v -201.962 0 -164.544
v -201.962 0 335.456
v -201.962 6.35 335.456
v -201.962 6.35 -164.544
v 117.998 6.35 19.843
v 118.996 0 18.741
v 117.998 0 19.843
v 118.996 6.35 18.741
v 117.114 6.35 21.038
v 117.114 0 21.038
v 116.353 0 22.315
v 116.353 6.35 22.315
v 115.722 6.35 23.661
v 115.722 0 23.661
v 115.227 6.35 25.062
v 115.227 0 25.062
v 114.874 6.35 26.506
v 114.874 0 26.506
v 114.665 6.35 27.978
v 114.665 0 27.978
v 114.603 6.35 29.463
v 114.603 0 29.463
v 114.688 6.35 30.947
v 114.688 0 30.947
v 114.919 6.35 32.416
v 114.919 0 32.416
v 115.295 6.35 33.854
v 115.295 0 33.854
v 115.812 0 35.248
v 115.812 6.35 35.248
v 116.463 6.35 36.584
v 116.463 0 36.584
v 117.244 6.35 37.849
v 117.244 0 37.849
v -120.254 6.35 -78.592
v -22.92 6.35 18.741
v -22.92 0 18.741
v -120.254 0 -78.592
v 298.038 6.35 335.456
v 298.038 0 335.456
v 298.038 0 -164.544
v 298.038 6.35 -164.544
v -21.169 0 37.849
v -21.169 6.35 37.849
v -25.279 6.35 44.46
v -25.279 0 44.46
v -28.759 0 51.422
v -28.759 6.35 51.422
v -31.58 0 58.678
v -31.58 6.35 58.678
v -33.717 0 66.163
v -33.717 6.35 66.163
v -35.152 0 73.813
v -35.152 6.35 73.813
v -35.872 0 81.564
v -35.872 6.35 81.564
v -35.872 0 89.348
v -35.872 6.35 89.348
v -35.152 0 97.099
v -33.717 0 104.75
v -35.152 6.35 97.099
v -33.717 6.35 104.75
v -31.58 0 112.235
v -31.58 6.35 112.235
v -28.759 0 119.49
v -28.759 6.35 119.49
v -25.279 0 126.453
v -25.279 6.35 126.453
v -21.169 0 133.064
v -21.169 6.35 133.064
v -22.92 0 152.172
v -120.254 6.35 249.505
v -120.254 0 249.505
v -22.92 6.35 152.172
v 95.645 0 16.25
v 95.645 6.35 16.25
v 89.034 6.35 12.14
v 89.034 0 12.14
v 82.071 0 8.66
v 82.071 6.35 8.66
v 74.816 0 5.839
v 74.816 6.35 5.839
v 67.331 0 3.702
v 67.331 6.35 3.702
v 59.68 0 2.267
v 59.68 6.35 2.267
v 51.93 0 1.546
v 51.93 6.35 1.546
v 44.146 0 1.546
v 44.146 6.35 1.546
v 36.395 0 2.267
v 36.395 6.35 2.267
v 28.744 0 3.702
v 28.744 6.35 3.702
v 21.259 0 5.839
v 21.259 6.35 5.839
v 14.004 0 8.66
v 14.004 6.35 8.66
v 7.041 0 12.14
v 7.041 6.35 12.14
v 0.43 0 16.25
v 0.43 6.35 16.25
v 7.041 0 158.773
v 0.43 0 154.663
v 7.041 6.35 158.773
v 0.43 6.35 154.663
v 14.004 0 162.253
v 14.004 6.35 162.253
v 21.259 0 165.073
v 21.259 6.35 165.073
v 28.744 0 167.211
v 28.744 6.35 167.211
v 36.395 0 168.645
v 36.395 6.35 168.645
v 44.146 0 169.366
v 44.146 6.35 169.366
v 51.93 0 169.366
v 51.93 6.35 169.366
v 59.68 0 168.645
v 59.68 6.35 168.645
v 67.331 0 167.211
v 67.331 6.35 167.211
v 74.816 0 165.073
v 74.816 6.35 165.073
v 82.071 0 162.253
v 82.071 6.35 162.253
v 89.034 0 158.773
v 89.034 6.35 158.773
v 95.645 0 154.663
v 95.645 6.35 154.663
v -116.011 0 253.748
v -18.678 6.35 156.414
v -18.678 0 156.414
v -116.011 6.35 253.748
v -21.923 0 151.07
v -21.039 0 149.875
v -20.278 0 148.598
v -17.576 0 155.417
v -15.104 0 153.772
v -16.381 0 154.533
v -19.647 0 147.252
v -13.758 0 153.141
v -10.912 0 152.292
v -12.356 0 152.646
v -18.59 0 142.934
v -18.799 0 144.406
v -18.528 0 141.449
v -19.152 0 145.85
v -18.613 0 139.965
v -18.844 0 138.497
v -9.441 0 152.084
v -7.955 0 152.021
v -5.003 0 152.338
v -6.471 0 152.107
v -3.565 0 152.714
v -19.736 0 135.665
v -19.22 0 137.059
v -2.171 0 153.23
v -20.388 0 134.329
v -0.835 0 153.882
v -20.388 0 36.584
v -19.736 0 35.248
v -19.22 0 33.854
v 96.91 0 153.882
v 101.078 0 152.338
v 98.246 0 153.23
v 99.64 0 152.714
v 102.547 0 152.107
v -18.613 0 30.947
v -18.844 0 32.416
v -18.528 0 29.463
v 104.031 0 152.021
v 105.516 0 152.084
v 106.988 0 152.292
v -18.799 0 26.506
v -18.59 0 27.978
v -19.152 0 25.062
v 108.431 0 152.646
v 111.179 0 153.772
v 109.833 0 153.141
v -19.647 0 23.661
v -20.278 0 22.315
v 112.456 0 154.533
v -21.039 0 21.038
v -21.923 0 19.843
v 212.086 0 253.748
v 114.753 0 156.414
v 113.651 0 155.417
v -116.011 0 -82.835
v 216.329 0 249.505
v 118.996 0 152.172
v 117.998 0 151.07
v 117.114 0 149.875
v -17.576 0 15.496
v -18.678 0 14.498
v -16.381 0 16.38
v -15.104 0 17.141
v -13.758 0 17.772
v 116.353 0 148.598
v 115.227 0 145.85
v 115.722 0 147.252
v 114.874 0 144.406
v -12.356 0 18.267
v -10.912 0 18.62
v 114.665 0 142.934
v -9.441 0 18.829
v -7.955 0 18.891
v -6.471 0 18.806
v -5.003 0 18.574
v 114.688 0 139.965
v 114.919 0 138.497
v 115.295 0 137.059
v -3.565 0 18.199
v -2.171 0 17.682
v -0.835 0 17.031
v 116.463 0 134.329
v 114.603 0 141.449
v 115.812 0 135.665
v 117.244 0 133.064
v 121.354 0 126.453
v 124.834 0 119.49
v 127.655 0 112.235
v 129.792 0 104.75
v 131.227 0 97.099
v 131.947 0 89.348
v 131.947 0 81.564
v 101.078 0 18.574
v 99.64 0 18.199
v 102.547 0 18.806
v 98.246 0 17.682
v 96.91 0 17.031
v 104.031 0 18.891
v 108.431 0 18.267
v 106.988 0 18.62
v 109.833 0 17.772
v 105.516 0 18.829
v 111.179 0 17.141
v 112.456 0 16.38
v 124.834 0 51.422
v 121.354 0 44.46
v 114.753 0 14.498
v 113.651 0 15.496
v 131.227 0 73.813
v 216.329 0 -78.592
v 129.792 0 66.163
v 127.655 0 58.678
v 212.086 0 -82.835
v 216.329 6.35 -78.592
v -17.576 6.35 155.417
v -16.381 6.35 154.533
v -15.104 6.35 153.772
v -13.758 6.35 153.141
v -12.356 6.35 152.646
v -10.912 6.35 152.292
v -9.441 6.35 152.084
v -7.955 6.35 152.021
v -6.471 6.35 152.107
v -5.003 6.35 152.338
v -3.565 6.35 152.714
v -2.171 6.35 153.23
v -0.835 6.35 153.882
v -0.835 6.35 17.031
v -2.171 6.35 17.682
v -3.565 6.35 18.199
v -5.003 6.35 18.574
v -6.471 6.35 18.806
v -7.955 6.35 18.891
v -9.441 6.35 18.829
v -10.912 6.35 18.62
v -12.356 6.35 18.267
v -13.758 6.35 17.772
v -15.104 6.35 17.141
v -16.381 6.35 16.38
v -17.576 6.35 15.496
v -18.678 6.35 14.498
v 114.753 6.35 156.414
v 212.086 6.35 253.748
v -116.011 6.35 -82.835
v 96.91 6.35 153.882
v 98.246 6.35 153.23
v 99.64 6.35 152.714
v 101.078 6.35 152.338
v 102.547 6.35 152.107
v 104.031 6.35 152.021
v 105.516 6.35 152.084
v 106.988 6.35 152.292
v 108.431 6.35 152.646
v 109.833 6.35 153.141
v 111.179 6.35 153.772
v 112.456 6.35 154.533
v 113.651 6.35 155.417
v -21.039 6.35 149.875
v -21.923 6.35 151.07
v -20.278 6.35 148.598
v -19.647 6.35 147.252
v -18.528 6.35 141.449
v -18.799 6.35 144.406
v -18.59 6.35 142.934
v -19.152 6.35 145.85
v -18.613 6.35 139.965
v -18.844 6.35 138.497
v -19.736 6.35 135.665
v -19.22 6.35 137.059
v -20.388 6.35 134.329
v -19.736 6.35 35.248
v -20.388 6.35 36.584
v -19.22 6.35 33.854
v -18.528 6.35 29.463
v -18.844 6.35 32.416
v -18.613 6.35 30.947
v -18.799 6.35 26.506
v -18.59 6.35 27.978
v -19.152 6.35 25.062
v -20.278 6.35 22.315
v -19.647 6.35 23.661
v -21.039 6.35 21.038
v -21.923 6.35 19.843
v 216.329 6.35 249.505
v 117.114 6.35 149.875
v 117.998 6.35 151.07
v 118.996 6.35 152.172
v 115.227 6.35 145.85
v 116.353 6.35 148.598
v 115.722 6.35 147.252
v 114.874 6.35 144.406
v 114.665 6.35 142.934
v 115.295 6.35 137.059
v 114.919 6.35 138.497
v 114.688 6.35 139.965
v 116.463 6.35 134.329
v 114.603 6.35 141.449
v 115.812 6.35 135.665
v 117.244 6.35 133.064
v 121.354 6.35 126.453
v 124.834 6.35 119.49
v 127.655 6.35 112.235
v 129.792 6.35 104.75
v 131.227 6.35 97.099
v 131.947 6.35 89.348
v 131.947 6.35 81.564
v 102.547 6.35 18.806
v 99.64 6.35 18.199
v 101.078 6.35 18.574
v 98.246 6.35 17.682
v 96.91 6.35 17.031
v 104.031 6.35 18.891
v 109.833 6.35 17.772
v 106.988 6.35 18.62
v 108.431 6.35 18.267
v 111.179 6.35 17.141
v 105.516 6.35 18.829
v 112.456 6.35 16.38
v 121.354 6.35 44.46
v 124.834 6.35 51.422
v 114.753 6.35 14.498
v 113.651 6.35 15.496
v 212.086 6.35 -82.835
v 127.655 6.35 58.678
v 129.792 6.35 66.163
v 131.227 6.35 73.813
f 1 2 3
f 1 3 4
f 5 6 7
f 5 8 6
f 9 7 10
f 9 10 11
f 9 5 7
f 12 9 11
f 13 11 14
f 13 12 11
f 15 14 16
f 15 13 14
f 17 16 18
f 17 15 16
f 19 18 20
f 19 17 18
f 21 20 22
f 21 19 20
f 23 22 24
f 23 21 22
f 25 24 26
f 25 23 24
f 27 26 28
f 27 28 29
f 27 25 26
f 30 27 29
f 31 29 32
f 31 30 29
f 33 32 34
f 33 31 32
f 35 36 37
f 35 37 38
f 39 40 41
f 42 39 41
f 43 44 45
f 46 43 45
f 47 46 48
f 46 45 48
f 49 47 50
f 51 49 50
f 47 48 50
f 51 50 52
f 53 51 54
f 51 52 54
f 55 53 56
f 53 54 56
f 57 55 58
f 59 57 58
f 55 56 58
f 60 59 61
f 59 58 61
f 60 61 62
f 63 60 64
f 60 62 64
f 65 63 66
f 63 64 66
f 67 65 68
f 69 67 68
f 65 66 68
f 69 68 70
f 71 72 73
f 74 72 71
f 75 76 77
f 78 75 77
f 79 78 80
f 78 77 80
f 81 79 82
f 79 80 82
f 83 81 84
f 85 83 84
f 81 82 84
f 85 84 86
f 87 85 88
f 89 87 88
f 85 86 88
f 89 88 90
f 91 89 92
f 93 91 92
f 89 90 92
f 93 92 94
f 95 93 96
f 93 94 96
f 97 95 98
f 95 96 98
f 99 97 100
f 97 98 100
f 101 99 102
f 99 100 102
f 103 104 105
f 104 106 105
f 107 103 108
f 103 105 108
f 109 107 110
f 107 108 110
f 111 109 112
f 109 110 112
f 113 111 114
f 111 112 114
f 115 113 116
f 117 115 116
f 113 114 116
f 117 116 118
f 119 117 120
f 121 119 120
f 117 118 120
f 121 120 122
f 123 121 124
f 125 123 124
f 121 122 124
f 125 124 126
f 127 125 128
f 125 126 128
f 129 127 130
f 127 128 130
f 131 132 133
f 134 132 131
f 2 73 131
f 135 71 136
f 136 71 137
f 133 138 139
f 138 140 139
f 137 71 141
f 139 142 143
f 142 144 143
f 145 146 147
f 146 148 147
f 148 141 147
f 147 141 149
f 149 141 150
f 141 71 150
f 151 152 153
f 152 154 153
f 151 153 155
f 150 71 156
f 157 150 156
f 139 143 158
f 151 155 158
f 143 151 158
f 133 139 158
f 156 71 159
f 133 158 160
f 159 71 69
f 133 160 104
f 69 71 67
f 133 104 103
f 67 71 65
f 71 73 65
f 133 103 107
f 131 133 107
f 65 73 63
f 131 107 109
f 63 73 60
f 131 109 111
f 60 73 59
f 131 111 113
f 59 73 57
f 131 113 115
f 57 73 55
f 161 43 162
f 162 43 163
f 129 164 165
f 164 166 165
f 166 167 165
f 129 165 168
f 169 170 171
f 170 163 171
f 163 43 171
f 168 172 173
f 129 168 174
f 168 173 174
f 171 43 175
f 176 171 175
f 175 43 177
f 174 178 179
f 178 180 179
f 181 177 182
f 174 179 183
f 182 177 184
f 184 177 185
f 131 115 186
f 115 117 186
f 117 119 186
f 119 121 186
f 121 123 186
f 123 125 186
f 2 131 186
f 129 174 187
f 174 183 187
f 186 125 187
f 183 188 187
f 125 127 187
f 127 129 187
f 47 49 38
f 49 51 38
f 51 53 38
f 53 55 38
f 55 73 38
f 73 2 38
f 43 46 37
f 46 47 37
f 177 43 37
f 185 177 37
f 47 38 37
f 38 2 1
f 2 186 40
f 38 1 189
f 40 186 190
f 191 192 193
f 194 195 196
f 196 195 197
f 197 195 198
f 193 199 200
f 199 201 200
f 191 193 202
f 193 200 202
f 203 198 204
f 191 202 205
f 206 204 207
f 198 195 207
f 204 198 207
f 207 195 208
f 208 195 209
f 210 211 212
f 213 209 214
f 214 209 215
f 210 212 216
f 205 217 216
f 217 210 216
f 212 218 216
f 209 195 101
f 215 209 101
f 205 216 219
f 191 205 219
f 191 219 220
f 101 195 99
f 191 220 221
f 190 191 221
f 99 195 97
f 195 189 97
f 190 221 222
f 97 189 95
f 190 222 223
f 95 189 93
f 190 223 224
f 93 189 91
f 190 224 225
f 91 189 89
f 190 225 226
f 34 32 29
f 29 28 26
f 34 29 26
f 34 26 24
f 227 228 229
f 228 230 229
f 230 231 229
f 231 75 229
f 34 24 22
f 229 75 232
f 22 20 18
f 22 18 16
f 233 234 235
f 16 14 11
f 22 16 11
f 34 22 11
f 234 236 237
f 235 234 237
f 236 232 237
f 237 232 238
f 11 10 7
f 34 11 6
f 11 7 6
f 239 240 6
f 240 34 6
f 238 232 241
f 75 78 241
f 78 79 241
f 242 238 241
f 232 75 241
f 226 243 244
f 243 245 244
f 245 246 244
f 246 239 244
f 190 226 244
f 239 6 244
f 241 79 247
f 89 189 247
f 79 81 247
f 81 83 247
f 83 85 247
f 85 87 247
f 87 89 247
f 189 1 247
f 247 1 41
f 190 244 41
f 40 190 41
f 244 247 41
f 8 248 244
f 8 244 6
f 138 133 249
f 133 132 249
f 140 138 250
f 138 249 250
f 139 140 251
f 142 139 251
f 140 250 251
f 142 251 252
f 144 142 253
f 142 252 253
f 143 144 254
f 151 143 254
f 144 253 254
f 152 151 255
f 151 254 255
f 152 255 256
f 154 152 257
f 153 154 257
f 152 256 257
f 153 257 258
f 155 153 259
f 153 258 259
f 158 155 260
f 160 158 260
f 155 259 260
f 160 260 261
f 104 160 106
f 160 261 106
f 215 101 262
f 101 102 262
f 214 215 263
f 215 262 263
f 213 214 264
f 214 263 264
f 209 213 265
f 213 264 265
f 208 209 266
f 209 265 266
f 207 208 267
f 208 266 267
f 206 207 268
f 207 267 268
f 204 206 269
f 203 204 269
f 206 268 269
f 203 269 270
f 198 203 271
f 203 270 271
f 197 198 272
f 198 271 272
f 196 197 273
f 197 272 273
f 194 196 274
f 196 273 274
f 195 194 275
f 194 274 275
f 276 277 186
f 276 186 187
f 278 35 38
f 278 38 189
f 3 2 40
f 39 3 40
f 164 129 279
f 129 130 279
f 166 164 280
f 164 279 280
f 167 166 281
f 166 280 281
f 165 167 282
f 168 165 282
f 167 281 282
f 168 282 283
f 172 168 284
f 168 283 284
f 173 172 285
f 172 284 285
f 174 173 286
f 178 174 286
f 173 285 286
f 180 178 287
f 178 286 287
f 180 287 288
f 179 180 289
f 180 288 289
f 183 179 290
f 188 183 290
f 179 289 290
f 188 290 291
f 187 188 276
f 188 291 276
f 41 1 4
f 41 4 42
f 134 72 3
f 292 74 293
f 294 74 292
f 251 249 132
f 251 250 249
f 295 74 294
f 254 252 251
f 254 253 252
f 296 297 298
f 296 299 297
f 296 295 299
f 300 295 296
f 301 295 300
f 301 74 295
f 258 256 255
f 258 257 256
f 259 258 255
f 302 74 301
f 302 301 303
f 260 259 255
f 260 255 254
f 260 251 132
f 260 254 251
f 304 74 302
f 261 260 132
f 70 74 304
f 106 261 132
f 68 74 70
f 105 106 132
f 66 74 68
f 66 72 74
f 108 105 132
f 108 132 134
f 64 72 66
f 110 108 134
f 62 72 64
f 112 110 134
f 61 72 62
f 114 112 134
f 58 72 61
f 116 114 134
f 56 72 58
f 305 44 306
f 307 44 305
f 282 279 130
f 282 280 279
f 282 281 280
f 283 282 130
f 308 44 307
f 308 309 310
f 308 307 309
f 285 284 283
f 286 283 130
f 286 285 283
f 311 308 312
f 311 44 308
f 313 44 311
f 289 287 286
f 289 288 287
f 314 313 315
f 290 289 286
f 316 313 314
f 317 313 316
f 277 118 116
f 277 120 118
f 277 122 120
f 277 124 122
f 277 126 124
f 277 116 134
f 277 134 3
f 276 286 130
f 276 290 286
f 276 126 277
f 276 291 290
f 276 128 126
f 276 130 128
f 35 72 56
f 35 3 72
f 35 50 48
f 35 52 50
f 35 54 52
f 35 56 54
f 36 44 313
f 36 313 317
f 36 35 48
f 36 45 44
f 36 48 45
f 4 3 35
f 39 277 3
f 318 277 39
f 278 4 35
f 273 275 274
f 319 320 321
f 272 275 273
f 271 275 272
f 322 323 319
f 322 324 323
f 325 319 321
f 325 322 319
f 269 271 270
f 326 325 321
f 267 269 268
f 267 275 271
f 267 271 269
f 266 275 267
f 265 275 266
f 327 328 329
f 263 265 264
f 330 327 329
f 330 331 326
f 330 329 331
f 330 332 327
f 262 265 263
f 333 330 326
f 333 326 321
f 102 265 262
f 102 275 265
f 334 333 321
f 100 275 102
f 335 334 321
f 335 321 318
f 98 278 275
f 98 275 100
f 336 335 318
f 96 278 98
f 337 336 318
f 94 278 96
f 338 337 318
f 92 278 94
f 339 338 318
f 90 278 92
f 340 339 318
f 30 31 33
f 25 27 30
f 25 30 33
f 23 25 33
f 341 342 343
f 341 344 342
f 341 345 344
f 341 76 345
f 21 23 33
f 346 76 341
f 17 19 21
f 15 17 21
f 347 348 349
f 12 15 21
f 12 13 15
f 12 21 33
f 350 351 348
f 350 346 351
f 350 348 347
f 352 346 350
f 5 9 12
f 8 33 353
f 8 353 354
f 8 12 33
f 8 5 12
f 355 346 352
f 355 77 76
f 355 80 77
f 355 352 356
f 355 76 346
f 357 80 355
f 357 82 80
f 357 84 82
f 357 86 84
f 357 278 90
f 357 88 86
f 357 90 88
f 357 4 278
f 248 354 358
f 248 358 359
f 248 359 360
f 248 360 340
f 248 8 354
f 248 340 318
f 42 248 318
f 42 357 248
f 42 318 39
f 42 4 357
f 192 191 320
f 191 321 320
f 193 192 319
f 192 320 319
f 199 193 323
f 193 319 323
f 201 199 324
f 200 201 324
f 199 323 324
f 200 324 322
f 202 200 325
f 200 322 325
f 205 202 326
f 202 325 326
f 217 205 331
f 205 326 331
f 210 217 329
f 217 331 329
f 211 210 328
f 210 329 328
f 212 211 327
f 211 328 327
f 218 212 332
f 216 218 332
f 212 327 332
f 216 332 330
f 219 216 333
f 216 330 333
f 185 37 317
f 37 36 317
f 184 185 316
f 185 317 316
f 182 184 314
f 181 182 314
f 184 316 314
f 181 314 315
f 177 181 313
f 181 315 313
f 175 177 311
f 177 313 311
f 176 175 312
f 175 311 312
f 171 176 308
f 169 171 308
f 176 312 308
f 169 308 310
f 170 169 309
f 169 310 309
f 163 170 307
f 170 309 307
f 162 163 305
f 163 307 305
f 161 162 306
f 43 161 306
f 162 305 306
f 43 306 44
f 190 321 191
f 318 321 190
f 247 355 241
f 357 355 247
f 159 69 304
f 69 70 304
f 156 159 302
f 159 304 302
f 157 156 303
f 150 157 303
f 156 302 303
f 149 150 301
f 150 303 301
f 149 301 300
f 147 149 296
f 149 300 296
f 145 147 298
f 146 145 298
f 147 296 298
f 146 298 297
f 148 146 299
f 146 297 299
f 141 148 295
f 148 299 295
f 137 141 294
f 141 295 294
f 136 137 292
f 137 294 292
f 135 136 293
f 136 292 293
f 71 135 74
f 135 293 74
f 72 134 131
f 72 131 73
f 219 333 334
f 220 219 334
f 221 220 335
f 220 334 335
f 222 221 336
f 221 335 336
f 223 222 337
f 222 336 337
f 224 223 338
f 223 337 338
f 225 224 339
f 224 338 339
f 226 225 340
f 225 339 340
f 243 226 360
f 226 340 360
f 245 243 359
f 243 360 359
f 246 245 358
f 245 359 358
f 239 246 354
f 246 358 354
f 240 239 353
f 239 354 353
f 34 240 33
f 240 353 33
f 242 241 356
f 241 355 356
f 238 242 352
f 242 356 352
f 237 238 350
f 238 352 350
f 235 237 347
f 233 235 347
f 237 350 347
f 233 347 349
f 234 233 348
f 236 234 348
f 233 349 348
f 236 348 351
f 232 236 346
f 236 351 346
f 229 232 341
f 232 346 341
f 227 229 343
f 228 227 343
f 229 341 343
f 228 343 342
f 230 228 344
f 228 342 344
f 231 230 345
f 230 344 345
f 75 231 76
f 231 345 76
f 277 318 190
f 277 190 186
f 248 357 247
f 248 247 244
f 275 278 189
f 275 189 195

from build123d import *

# Parameters (mm, degrees)
SKETCH1_W           = 500
SKETCH1_H           = 500
BOSS_EXTRUDE1_DEPTH = 6.35
SKETCH2_R           = 84
CUT_EXTRUDE1_DEPTH  = 6.35
CUT_EXTRUDE3_DEPTH  = 6.35
FILLET1_R           = 15


with BuildPart() as part:
    # Sketch1 → Boss-Extrude1 (new body)
    with BuildSketch(Plane(origin=(0, 0, 0), x_dir=(1, 0, 0), z_dir=(0, 1, 0))):
        with Locations((48.037604912, -85.456276451)):
            Rectangle(SKETCH1_W, SKETCH1_H)
    extrude(amount=BOSS_EXTRUDE1_DEPTH)

    # Sketch2 → Cut-Extrude1 (cut)
    with BuildSketch(Plane(origin=(0, 6.35, 0), x_dir=(1, 0, 0), z_dir=(0, 1, 0))):
        with Locations((48.037604912, -85.456276451)):
            Circle(SKETCH2_R)
    extrude(amount=-CUT_EXTRUDE1_DEPTH, mode=Mode.SUBTRACT)

    # Sketch3 → Cut-Extrude3 (cut)
    with BuildSketch(Plane(origin=(0, 6.35, 0), x_dir=(1, 0, 0), z_dir=(0, 1, 0))):
        Polygon((216.329018834, 78.592496784), (103.191933845, -34.544588206), (98.949293158, -30.301947519), (212.086378147, 82.835137471), align=None)
        Polygon((-120.25380901, 78.592496784), (-116.011168323, 82.835137471), (-2.874083333, -30.301947519), (-7.11672402, -34.544588206), align=None)
        Polygon((212.086378147, -253.747690374), (98.949293158, -140.610605384), (103.191933845, -136.367964697), (216.329018835, -249.505049687), align=None)
        Polygon((-120.25380901, -249.505049687), (-7.11672402, -136.367964697), (-2.874083333, -140.610605384), (-116.011168323, -253.747690374), align=None)
    extrude(amount=-CUT_EXTRUDE3_DEPTH, mode=Mode.SUBTRACT)

    # Fillet1
    fillet1_edges = [part.edges().sort_by_distance(p)[0] for p in [
        (105.275361381, 3.175, 23.975879296),
        (109.518002068, 3.175, 28.218519983),
        (109.518002068, 3.175, 142.69403292),
        (105.275361381, 3.175, 146.936673607),
        (-13.442792244, 3.175, 142.69403292),
        (-9.200151557, 3.175, 146.936673607),
        (-13.442792244, 3.175, 28.218519983),
        (-9.200151557, 3.175, 23.975879296),
    ]]
    fillet(fillet1_edges, radius=FILLET1_R)


solid = part.part
